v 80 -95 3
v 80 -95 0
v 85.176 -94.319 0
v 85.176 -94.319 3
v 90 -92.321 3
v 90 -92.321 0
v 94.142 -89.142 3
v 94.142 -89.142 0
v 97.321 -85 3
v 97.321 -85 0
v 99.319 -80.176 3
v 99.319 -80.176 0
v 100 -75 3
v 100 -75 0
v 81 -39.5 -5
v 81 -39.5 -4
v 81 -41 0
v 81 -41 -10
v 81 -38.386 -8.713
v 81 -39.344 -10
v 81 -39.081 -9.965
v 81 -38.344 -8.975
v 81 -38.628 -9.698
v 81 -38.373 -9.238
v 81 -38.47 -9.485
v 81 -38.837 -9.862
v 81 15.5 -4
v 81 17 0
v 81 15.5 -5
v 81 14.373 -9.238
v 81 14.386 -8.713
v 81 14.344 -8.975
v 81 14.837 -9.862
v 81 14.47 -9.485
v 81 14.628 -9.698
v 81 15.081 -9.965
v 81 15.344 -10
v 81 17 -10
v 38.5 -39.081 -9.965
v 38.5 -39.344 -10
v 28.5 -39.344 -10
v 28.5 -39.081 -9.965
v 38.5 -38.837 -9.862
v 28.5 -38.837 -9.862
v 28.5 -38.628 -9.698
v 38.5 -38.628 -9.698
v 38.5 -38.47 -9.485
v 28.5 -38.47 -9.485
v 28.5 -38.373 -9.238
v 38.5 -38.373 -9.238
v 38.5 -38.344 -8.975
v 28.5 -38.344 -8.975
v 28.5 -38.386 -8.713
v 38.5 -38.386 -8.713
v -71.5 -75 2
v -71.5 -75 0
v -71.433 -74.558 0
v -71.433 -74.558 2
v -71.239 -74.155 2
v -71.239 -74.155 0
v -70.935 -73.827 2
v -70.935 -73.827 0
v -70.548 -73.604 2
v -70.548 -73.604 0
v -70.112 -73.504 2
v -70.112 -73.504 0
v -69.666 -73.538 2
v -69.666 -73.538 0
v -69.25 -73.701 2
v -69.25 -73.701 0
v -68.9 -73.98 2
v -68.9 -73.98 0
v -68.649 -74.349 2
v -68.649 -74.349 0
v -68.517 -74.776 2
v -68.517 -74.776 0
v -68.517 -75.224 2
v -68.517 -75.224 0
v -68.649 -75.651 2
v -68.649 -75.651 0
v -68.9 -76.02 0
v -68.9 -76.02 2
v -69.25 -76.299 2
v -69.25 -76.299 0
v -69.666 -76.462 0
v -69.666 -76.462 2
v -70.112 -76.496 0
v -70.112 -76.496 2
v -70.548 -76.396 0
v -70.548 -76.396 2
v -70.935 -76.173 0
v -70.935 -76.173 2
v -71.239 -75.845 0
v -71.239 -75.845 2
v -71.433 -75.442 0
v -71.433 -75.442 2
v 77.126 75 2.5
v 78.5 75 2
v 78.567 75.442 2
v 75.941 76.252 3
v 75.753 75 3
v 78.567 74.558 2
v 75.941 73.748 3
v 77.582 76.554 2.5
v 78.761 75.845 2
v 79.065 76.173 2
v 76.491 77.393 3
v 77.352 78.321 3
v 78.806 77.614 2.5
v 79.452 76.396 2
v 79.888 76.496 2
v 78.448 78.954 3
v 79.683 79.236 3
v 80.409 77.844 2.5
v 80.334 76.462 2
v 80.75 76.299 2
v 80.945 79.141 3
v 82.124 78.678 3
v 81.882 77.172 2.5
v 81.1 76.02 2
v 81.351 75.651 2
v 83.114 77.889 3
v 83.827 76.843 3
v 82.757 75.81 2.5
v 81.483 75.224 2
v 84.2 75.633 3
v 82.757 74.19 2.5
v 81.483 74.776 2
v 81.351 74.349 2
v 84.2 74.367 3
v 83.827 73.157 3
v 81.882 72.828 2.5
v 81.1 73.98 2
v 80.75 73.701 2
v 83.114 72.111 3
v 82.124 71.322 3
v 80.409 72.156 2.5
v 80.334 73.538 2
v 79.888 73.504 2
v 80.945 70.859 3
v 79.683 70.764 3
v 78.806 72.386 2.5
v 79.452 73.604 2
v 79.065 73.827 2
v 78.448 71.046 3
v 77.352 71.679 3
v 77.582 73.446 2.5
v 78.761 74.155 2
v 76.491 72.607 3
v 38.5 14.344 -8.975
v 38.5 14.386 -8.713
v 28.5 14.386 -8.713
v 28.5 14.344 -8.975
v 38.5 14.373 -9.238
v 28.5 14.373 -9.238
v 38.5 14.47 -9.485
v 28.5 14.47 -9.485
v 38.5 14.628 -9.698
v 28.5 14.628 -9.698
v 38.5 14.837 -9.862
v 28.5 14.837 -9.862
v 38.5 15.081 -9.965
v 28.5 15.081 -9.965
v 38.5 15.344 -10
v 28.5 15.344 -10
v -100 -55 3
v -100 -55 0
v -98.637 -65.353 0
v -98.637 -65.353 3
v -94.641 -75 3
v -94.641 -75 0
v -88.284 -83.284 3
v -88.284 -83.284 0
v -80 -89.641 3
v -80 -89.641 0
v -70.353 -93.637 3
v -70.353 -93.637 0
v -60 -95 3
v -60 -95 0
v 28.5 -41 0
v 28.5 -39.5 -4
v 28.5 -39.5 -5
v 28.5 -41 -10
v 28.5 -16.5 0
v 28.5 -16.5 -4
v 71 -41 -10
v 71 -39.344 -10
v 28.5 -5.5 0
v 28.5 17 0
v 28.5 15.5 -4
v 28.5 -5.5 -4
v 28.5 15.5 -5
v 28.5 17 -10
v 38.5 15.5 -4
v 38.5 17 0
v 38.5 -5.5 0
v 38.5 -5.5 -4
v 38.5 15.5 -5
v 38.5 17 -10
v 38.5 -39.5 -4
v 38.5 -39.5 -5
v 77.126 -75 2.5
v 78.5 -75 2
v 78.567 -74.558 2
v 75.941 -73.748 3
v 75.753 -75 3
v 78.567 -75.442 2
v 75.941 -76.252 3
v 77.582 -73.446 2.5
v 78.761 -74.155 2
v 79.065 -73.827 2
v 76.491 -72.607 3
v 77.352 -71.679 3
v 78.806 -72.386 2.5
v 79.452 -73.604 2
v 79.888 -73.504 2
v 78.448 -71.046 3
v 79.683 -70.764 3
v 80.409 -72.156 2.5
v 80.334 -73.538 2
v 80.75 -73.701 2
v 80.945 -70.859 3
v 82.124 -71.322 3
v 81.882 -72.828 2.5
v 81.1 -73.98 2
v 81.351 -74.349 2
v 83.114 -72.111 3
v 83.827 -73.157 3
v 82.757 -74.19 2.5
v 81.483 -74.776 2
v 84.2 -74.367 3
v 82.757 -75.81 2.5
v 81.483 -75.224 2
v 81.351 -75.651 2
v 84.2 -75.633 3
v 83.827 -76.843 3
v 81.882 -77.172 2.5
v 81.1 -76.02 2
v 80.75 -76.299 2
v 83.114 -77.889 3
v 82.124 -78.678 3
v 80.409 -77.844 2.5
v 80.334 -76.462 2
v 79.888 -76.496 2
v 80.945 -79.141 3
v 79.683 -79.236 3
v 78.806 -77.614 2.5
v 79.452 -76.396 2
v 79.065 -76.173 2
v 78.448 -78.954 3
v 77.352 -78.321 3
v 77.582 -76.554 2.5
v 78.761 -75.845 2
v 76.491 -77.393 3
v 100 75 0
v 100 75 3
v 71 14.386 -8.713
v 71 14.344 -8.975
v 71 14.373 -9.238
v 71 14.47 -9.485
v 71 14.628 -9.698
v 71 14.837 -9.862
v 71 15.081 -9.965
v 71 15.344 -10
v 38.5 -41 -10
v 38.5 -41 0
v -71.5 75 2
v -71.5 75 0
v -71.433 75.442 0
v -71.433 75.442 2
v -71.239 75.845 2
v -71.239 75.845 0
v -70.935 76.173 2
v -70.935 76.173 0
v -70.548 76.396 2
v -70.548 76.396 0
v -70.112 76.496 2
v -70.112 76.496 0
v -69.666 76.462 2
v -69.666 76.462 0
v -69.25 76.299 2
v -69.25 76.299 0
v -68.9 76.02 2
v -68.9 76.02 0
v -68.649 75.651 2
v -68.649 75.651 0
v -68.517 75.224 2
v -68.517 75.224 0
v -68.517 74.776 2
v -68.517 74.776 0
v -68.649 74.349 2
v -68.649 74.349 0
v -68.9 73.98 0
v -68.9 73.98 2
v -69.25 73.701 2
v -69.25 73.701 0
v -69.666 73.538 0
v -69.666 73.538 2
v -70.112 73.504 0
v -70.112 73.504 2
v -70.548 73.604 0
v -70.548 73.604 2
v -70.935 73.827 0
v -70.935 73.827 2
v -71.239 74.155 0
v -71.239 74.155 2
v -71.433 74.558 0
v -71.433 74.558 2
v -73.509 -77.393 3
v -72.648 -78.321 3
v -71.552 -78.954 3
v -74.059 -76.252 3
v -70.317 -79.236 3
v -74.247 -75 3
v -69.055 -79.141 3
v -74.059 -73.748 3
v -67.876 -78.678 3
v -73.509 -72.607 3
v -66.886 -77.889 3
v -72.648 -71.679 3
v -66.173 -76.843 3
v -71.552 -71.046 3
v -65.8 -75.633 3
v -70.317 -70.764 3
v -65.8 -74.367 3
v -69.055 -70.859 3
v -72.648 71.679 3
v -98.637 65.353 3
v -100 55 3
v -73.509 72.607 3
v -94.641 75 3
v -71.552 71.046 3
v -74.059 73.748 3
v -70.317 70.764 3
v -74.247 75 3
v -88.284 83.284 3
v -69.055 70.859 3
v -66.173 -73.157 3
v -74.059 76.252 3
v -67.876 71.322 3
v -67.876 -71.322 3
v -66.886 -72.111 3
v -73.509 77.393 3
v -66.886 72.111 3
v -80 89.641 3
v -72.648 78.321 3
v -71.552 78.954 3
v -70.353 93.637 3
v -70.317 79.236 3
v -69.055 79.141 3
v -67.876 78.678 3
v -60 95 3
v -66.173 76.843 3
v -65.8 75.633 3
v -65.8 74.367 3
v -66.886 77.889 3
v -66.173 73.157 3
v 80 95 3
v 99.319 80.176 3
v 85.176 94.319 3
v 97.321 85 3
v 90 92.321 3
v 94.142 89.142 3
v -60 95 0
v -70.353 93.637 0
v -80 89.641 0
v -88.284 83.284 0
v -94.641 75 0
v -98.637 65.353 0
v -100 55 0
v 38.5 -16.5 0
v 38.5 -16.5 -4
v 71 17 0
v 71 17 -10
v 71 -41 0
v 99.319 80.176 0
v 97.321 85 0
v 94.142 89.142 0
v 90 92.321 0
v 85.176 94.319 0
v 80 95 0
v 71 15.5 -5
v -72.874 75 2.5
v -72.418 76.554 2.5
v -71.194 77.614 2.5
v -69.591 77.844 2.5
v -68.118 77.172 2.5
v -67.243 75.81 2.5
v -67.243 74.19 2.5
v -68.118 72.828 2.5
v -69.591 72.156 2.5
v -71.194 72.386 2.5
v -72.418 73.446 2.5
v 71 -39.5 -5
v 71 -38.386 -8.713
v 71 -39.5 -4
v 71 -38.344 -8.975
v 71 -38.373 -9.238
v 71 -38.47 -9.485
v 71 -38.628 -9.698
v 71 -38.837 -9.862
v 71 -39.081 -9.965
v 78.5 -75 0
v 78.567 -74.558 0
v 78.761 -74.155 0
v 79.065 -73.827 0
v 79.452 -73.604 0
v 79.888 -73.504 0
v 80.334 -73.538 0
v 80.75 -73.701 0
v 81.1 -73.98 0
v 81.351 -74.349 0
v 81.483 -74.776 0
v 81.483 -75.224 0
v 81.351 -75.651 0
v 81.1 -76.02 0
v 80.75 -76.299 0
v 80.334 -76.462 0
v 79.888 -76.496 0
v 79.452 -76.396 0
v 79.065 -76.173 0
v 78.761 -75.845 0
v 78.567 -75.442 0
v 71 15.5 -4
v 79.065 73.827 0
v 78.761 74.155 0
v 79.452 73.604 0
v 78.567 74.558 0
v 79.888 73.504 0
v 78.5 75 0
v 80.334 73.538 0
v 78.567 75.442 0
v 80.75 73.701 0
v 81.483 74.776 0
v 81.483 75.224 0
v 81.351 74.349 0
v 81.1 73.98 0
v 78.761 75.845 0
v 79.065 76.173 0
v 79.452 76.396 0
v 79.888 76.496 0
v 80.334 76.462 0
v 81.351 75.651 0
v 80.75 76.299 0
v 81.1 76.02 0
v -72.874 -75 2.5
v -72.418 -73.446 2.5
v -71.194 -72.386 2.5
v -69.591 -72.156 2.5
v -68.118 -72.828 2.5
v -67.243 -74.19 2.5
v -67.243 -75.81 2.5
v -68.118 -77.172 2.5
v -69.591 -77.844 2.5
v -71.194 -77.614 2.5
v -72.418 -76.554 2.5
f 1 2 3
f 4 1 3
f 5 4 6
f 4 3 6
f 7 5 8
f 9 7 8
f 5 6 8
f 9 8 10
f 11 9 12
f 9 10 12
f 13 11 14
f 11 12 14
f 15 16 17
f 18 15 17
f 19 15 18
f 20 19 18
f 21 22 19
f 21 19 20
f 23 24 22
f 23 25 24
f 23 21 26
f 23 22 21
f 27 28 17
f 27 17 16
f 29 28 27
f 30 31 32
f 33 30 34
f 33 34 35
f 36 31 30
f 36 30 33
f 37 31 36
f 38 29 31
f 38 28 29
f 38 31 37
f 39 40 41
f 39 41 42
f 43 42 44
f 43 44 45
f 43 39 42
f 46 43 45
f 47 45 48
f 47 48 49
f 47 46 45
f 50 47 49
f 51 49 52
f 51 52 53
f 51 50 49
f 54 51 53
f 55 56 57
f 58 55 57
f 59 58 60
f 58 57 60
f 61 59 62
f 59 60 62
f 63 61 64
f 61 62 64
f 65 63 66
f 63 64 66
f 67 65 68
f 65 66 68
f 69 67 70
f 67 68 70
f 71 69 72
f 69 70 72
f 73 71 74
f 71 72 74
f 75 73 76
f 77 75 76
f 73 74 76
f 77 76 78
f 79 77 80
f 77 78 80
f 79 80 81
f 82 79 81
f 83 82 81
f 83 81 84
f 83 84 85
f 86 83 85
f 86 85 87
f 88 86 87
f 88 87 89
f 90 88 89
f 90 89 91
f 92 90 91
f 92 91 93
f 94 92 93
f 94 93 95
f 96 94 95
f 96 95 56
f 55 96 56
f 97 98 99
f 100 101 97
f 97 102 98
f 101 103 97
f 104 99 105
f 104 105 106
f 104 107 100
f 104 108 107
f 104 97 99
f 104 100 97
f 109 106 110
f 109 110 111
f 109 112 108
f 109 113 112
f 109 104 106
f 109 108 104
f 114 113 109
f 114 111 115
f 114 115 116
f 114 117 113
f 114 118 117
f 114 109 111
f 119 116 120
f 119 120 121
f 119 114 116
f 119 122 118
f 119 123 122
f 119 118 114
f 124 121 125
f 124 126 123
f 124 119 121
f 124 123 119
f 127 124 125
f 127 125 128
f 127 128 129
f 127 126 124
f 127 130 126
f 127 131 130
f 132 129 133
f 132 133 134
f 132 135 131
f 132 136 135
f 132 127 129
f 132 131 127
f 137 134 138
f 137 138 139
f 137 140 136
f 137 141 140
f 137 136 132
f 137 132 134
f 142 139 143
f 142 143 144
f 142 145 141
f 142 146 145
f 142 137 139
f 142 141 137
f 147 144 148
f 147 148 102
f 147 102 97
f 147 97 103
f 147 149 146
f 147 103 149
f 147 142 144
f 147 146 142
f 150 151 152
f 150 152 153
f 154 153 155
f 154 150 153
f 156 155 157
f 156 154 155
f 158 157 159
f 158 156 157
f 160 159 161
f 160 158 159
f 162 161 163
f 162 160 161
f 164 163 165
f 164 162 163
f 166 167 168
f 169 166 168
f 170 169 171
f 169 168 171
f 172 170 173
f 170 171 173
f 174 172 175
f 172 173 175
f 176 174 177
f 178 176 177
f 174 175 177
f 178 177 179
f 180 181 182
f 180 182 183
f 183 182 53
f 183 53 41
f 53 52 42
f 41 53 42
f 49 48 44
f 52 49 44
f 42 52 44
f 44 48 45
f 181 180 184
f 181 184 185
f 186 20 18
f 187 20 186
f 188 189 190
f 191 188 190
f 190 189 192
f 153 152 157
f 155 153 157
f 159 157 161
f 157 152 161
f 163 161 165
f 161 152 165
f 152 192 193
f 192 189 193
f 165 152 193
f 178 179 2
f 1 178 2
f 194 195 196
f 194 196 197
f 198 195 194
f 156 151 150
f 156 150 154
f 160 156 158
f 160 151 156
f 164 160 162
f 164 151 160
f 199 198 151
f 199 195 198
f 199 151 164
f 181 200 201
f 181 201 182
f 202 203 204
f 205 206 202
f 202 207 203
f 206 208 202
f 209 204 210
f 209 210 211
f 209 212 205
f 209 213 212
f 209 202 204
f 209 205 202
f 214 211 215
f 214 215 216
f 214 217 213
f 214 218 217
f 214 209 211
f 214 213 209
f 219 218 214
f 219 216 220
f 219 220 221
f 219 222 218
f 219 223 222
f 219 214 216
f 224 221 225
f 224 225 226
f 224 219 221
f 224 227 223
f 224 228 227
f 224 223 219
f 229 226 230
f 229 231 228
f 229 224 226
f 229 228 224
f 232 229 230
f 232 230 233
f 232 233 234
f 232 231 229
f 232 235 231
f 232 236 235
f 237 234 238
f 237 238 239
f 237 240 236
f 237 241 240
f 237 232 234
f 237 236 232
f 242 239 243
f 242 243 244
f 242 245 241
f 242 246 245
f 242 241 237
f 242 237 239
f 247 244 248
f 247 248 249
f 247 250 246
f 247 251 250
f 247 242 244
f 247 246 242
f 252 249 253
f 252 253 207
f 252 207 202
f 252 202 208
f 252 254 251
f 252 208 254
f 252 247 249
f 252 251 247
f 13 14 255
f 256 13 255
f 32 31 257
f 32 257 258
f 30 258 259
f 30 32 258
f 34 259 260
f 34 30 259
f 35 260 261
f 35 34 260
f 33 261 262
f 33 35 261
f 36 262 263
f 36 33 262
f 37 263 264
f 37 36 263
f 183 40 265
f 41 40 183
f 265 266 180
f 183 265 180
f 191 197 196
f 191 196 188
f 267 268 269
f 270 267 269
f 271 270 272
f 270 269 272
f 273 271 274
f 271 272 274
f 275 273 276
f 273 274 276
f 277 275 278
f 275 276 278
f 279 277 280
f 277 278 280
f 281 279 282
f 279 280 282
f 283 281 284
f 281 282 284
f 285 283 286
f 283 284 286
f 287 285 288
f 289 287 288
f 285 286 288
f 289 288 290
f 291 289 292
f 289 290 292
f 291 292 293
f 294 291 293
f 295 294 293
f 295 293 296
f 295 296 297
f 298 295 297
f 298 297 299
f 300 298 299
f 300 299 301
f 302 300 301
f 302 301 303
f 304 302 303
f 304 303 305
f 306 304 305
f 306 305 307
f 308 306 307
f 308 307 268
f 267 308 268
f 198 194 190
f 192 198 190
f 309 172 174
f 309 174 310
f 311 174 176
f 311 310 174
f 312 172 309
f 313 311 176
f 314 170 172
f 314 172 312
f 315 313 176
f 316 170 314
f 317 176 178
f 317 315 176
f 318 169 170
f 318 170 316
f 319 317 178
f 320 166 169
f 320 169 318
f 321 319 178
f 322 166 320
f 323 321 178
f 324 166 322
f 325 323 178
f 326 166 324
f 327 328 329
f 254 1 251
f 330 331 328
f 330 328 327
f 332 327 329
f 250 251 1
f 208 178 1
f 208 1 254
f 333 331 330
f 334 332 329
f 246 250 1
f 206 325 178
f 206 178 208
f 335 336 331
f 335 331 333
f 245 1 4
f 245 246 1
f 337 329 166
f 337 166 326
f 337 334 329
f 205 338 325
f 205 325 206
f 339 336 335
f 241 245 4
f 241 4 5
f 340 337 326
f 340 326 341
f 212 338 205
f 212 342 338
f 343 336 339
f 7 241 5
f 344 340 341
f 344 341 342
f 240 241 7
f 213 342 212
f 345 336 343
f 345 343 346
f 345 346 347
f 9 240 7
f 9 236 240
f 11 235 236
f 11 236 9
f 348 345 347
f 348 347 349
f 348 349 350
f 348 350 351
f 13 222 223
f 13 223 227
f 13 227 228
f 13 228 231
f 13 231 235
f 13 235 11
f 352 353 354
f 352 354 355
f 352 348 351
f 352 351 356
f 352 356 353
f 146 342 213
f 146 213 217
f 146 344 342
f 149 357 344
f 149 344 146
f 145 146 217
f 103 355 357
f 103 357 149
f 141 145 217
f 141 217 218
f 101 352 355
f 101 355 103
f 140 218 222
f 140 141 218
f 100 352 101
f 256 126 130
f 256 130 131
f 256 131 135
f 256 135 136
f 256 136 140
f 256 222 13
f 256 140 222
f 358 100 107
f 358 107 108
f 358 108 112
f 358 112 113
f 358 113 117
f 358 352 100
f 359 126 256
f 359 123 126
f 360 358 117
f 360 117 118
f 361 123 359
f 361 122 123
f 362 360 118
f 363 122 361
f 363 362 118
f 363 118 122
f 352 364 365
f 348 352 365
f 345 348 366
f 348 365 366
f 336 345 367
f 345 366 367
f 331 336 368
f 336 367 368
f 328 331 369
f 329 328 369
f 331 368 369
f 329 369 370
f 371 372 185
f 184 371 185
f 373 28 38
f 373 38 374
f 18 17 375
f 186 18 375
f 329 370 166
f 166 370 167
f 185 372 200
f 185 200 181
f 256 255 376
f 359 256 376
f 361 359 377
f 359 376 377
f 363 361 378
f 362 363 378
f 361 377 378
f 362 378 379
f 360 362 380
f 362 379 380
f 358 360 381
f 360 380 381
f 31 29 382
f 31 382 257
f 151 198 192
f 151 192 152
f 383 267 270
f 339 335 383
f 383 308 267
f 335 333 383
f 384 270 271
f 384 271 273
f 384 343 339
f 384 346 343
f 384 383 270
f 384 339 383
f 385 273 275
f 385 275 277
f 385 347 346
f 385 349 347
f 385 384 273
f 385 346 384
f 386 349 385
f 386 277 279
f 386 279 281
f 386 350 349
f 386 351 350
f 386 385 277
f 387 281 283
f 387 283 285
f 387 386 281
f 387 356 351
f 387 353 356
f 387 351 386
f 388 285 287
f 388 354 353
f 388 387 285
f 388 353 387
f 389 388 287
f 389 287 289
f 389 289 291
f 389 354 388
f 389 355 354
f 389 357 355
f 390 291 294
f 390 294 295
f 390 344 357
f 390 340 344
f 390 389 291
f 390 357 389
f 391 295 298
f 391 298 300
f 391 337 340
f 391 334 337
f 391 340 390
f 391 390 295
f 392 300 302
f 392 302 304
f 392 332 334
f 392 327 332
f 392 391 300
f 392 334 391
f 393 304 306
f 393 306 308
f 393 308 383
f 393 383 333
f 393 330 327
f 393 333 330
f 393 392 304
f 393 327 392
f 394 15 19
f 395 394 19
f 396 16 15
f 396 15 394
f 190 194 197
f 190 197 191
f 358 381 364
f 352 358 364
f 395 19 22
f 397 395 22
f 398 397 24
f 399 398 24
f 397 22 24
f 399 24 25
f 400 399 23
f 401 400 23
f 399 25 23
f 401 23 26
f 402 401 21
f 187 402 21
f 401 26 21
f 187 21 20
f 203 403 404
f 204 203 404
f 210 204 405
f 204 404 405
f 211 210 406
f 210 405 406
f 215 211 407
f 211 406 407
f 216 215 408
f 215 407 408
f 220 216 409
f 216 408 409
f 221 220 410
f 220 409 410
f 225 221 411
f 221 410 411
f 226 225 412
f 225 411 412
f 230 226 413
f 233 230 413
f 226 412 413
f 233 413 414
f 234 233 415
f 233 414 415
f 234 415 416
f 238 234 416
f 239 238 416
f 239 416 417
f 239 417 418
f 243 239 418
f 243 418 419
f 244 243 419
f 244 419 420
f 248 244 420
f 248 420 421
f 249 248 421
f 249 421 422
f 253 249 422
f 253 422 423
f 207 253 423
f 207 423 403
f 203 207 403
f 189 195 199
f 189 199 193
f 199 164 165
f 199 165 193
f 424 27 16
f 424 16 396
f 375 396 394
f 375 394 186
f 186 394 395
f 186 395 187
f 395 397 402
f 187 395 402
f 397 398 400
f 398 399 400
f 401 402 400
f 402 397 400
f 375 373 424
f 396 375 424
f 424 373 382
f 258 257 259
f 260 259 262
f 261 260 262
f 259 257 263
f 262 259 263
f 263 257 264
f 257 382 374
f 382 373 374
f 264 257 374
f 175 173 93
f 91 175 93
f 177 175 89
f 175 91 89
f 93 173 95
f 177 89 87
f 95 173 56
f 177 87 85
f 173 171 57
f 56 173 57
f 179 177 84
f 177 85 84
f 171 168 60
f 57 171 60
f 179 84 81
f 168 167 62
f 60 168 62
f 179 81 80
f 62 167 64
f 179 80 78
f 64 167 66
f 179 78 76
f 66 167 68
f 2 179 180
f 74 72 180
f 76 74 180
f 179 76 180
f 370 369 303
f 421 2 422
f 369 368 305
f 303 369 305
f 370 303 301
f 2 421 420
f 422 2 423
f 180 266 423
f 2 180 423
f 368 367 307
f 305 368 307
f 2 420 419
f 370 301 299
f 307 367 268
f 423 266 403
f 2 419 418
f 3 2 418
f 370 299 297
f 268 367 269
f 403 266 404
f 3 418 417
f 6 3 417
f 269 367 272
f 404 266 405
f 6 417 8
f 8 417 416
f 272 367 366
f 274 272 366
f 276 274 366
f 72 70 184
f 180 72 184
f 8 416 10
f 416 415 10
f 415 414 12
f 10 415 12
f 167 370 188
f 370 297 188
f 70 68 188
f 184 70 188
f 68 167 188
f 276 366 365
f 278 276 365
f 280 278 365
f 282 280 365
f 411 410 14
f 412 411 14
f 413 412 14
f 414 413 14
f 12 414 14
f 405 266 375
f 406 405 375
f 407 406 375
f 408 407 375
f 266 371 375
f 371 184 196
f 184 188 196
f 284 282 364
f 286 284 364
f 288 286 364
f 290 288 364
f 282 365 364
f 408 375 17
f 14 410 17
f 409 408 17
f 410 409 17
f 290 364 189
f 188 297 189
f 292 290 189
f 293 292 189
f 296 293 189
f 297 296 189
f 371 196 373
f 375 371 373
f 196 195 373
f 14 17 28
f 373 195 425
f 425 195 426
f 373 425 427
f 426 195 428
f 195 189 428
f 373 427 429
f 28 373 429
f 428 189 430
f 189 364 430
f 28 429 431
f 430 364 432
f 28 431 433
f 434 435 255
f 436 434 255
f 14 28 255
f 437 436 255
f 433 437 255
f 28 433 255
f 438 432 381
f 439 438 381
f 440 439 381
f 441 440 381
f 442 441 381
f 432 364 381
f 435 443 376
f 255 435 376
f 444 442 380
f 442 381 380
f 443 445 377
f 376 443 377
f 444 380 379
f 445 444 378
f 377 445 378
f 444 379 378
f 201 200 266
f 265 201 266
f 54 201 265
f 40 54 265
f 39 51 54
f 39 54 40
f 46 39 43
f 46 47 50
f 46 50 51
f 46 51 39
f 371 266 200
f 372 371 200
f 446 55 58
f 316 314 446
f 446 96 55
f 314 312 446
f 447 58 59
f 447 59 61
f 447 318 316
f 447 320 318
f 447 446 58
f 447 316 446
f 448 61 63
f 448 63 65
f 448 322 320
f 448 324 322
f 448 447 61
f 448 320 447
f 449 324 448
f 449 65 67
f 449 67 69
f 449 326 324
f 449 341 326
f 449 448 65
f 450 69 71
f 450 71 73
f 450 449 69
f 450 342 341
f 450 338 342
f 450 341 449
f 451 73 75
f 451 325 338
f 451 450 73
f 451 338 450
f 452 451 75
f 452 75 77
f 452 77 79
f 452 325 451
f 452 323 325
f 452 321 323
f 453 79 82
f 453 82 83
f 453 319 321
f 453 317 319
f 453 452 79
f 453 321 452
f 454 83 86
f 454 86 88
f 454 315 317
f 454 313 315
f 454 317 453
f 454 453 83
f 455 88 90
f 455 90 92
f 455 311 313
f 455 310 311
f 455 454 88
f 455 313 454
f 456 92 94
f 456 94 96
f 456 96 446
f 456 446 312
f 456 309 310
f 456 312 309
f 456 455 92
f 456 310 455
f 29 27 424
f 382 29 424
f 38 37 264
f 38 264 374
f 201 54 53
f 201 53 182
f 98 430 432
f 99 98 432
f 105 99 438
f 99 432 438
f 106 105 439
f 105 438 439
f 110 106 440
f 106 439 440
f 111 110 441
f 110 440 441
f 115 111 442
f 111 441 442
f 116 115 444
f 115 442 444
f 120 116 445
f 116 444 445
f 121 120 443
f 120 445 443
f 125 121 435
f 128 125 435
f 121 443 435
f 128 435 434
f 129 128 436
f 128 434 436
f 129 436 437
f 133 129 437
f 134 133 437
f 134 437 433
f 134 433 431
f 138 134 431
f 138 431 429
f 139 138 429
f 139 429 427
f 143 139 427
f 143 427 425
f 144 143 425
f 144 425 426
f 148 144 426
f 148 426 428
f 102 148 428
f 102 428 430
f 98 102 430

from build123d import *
from OCP.BRepFilletAPI import BRepFilletAPI_MakeChamfer

# Parameters (mm, degrees)
BASE_DEPTH                   = 3
SKETCH2_R                    = 1.5
SCREWHOLES_DEPTH             = 138.963763358
CHAMFER1_SIZE                = 1
CHAMFER1_SIZE2               = 2.747477419
SKETCH3_W                    = 10
SKETCH3_H                    = 55
ARDUINORISERS_DEPTH          = 4
SKETCH4_W                    = 10
SKETCH4_H                    = 1.5
ARDUINOCLAMPSSIDE_DEPTH      = 10
ARDUINOCLAMPSCATCHERS1_DEPTH = 10
ARDUINOCLAMPSCATCHERS2_DEPTH = 10
SKETCH7_W                    = 10
SKETCH7_H                    = 11
ISPSPACE_DEPTH               = 4


with BuildPart() as part:
    # Sketch1 → base (new body)
    with BuildSketch(Plane.XY):
        with BuildLine():
            Line((80, 95), (-60, 95))
            ThreePointArc((-60, 95), (-88.284271247, 83.284271247), (-100, 55))
            Line((-100, 55), (-100, -55))
            ThreePointArc((-100, -55), (-88.284271247, -83.284271247), (-60, -95))
            Line((-60, -95), (80, -95))
            ThreePointArc((80, -95), (94.142135624, -89.142135624), (100, -75))
            Line((100, -75), (100, 75))
            ThreePointArc((100, 75), (94.142135624, 89.142135624), (80, 95))
        make_face()
    extrude(amount=BASE_DEPTH)

    # Sketch2 → screwHoles (cut, through all)
    with BuildSketch(Plane(origin=(0, 0, 0), x_dir=(-1, 0, 0), z_dir=(0, 0, -1))):
        with Locations((-80, 75)):
            Circle(SKETCH2_R)
        with Locations((-80, -75)):
            Circle(SKETCH2_R)
        with Locations((70, -75)):
            Circle(SKETCH2_R)
        with Locations((70, 75)):
            Circle(SKETCH2_R)
    extrude(amount=-SCREWHOLES_DEPTH, mode=Mode.SUBTRACT)

    # Chamfer1: one chamfer whose edges measure the first distance from different faces: ONE call of the kernel's chamfer builder (chamfer() names one face for all edges)
    chamfer1_edges_1 = [part.edges().sort_by_distance(p)[0] for p in [
        (81.5, 75, 3),
    ]]
    chamfer1_side_1 = [part.faces().sort_by_distance(p)[0] for p in [
        (81.5, 75, 1.5),
    ]]
    chamfer1_edges_2 = [part.edges().sort_by_distance(p)[0] for p in [
        (81.5, -75, 3),
    ]]
    chamfer1_side_2 = [part.faces().sort_by_distance(p)[0] for p in [
        (81.5, -75, 1.5),
    ]]
    chamfer1_edges_3 = [part.edges().sort_by_distance(p)[0] for p in [
        (-68.5, -75, 3),
    ]]
    chamfer1_side_3 = [part.faces().sort_by_distance(p)[0] for p in [
        (-68.5, -75, 1.5),
    ]]
    chamfer1_edges_4 = [part.edges().sort_by_distance(p)[0] for p in [
        (-68.5, 75, 3),
    ]]
    chamfer1_side_4 = [part.faces().sort_by_distance(p)[0] for p in [
        (-68.5, 75, 1.5),
    ]]
    chamfer1 = BRepFilletAPI_MakeChamfer(part.part.solid().wrapped)
    for e in chamfer1_edges_1:
        chamfer1.Add(CHAMFER1_SIZE, CHAMFER1_SIZE2, e.wrapped, chamfer1_side_1[0].wrapped)  # the first distance lies on this face
    for e in chamfer1_edges_2:
        chamfer1.Add(CHAMFER1_SIZE, CHAMFER1_SIZE2, e.wrapped, chamfer1_side_2[0].wrapped)  # the first distance lies on this face
    for e in chamfer1_edges_3:
        chamfer1.Add(CHAMFER1_SIZE, CHAMFER1_SIZE2, e.wrapped, chamfer1_side_3[0].wrapped)  # the first distance lies on this face
    for e in chamfer1_edges_4:
        chamfer1.Add(CHAMFER1_SIZE, CHAMFER1_SIZE2, e.wrapped, chamfer1_side_4[0].wrapped)  # the first distance lies on this face
    add(Compound.cast(chamfer1.Shape()), mode=Mode.REPLACE)

    # Sketch3 → arduinoRisers (add)
    with BuildSketch(Plane(origin=(0, 0, 0), x_dir=(-1, 0, 0), z_dir=(0, 0, -1))):
        with Locations((-76, -12)):
            Rectangle(SKETCH3_W, SKETCH3_H)
        with Locations((-33.5, -12)):
            Rectangle(SKETCH3_W, SKETCH3_H)
    extrude(amount=ARDUINORISERS_DEPTH)

    # Sketch4 → arduinoClampsSide (add)
    with BuildSketch(Plane(origin=(0, 0, 0), x_dir=(-1, 0, 0), z_dir=(0, 0, -1))):
        with Locations((-76, -40.25)):
            Rectangle(SKETCH4_W, SKETCH4_H)
        with Locations((-33.5, -40.25)):
            Rectangle(SKETCH4_W, SKETCH4_H)
        with Locations((-76, 16.25)):
            Rectangle(SKETCH4_W, SKETCH4_H)
        with Locations((-33.5, 16.25)):
            Rectangle(SKETCH4_W, SKETCH4_H)
    extrude(amount=ARDUINOCLAMPSSIDE_DEPTH)

    # Sketch5 → arduinoClampsCatchers1 (add)
    with BuildSketch(Plane(origin=(81, 0, 0), x_dir=(0, 0, -1), z_dir=(1, 0, 0))):
        with BuildLine():
            Line((5, 15.5), (8.712652114, 14.386204366))
            ThreePointArc((8.712652114, 14.386204366), (9.59693053, 14.541737723), (10, 15.344030651))
            Line((10, 15.344030651), (10, 15.5))
            Line((10, 15.5), (5, 15.5))
        make_face()
        with BuildLine():
            Line((5, -39.5), (8.712652114, -38.386204366))
            ThreePointArc((8.712652114, -38.386204366), (9.59693053, -38.541737723), (10, -39.344030651))
            Line((10, -39.344030651), (10, -39.5))
            Line((10, -39.5), (5, -39.5))
        make_face()
    extrude(amount=-ARDUINOCLAMPSCATCHERS1_DEPTH)

    # Sketch6 → arduinoClampsCatchers2 (add)
    with BuildSketch(Plane(origin=(38.5, 0, 0), x_dir=(0, 0, -1), z_dir=(1, 0, 0))):
        with BuildLine():
            Line((5, 15.5), (8.712652114, 14.386204366))
            ThreePointArc((8.712652114, 14.386204366), (9.59693053, 14.541737723), (10, 15.344030651))
            Line((10, 15.344030651), (10, 15.5))
            Line((10, 15.5), (5, 15.5))
        make_face()
        with BuildLine():
            Line((8.712652114, -38.386204366), (5, -39.5))
            Line((5, -39.5), (10, -39.5))
            Line((10, -39.5), (10, -39.344030651))
            ThreePointArc((10, -39.344030651), (9.59693053, -38.541737723), (8.712652114, -38.386204366))
        make_face()
    extrude(amount=-ARDUINOCLAMPSCATCHERS2_DEPTH)

    # Sketch7 → ISPspace (cut)
    with BuildSketch(Plane(origin=(0, 0, -4), x_dir=(-1, 0, 0), z_dir=(0, 0, -1))):
        with Locations((-33.5, -11)):
            Rectangle(SKETCH7_W, SKETCH7_H)
    extrude(amount=-ISPSPACE_DEPTH, mode=Mode.SUBTRACT)


solid = part.part
